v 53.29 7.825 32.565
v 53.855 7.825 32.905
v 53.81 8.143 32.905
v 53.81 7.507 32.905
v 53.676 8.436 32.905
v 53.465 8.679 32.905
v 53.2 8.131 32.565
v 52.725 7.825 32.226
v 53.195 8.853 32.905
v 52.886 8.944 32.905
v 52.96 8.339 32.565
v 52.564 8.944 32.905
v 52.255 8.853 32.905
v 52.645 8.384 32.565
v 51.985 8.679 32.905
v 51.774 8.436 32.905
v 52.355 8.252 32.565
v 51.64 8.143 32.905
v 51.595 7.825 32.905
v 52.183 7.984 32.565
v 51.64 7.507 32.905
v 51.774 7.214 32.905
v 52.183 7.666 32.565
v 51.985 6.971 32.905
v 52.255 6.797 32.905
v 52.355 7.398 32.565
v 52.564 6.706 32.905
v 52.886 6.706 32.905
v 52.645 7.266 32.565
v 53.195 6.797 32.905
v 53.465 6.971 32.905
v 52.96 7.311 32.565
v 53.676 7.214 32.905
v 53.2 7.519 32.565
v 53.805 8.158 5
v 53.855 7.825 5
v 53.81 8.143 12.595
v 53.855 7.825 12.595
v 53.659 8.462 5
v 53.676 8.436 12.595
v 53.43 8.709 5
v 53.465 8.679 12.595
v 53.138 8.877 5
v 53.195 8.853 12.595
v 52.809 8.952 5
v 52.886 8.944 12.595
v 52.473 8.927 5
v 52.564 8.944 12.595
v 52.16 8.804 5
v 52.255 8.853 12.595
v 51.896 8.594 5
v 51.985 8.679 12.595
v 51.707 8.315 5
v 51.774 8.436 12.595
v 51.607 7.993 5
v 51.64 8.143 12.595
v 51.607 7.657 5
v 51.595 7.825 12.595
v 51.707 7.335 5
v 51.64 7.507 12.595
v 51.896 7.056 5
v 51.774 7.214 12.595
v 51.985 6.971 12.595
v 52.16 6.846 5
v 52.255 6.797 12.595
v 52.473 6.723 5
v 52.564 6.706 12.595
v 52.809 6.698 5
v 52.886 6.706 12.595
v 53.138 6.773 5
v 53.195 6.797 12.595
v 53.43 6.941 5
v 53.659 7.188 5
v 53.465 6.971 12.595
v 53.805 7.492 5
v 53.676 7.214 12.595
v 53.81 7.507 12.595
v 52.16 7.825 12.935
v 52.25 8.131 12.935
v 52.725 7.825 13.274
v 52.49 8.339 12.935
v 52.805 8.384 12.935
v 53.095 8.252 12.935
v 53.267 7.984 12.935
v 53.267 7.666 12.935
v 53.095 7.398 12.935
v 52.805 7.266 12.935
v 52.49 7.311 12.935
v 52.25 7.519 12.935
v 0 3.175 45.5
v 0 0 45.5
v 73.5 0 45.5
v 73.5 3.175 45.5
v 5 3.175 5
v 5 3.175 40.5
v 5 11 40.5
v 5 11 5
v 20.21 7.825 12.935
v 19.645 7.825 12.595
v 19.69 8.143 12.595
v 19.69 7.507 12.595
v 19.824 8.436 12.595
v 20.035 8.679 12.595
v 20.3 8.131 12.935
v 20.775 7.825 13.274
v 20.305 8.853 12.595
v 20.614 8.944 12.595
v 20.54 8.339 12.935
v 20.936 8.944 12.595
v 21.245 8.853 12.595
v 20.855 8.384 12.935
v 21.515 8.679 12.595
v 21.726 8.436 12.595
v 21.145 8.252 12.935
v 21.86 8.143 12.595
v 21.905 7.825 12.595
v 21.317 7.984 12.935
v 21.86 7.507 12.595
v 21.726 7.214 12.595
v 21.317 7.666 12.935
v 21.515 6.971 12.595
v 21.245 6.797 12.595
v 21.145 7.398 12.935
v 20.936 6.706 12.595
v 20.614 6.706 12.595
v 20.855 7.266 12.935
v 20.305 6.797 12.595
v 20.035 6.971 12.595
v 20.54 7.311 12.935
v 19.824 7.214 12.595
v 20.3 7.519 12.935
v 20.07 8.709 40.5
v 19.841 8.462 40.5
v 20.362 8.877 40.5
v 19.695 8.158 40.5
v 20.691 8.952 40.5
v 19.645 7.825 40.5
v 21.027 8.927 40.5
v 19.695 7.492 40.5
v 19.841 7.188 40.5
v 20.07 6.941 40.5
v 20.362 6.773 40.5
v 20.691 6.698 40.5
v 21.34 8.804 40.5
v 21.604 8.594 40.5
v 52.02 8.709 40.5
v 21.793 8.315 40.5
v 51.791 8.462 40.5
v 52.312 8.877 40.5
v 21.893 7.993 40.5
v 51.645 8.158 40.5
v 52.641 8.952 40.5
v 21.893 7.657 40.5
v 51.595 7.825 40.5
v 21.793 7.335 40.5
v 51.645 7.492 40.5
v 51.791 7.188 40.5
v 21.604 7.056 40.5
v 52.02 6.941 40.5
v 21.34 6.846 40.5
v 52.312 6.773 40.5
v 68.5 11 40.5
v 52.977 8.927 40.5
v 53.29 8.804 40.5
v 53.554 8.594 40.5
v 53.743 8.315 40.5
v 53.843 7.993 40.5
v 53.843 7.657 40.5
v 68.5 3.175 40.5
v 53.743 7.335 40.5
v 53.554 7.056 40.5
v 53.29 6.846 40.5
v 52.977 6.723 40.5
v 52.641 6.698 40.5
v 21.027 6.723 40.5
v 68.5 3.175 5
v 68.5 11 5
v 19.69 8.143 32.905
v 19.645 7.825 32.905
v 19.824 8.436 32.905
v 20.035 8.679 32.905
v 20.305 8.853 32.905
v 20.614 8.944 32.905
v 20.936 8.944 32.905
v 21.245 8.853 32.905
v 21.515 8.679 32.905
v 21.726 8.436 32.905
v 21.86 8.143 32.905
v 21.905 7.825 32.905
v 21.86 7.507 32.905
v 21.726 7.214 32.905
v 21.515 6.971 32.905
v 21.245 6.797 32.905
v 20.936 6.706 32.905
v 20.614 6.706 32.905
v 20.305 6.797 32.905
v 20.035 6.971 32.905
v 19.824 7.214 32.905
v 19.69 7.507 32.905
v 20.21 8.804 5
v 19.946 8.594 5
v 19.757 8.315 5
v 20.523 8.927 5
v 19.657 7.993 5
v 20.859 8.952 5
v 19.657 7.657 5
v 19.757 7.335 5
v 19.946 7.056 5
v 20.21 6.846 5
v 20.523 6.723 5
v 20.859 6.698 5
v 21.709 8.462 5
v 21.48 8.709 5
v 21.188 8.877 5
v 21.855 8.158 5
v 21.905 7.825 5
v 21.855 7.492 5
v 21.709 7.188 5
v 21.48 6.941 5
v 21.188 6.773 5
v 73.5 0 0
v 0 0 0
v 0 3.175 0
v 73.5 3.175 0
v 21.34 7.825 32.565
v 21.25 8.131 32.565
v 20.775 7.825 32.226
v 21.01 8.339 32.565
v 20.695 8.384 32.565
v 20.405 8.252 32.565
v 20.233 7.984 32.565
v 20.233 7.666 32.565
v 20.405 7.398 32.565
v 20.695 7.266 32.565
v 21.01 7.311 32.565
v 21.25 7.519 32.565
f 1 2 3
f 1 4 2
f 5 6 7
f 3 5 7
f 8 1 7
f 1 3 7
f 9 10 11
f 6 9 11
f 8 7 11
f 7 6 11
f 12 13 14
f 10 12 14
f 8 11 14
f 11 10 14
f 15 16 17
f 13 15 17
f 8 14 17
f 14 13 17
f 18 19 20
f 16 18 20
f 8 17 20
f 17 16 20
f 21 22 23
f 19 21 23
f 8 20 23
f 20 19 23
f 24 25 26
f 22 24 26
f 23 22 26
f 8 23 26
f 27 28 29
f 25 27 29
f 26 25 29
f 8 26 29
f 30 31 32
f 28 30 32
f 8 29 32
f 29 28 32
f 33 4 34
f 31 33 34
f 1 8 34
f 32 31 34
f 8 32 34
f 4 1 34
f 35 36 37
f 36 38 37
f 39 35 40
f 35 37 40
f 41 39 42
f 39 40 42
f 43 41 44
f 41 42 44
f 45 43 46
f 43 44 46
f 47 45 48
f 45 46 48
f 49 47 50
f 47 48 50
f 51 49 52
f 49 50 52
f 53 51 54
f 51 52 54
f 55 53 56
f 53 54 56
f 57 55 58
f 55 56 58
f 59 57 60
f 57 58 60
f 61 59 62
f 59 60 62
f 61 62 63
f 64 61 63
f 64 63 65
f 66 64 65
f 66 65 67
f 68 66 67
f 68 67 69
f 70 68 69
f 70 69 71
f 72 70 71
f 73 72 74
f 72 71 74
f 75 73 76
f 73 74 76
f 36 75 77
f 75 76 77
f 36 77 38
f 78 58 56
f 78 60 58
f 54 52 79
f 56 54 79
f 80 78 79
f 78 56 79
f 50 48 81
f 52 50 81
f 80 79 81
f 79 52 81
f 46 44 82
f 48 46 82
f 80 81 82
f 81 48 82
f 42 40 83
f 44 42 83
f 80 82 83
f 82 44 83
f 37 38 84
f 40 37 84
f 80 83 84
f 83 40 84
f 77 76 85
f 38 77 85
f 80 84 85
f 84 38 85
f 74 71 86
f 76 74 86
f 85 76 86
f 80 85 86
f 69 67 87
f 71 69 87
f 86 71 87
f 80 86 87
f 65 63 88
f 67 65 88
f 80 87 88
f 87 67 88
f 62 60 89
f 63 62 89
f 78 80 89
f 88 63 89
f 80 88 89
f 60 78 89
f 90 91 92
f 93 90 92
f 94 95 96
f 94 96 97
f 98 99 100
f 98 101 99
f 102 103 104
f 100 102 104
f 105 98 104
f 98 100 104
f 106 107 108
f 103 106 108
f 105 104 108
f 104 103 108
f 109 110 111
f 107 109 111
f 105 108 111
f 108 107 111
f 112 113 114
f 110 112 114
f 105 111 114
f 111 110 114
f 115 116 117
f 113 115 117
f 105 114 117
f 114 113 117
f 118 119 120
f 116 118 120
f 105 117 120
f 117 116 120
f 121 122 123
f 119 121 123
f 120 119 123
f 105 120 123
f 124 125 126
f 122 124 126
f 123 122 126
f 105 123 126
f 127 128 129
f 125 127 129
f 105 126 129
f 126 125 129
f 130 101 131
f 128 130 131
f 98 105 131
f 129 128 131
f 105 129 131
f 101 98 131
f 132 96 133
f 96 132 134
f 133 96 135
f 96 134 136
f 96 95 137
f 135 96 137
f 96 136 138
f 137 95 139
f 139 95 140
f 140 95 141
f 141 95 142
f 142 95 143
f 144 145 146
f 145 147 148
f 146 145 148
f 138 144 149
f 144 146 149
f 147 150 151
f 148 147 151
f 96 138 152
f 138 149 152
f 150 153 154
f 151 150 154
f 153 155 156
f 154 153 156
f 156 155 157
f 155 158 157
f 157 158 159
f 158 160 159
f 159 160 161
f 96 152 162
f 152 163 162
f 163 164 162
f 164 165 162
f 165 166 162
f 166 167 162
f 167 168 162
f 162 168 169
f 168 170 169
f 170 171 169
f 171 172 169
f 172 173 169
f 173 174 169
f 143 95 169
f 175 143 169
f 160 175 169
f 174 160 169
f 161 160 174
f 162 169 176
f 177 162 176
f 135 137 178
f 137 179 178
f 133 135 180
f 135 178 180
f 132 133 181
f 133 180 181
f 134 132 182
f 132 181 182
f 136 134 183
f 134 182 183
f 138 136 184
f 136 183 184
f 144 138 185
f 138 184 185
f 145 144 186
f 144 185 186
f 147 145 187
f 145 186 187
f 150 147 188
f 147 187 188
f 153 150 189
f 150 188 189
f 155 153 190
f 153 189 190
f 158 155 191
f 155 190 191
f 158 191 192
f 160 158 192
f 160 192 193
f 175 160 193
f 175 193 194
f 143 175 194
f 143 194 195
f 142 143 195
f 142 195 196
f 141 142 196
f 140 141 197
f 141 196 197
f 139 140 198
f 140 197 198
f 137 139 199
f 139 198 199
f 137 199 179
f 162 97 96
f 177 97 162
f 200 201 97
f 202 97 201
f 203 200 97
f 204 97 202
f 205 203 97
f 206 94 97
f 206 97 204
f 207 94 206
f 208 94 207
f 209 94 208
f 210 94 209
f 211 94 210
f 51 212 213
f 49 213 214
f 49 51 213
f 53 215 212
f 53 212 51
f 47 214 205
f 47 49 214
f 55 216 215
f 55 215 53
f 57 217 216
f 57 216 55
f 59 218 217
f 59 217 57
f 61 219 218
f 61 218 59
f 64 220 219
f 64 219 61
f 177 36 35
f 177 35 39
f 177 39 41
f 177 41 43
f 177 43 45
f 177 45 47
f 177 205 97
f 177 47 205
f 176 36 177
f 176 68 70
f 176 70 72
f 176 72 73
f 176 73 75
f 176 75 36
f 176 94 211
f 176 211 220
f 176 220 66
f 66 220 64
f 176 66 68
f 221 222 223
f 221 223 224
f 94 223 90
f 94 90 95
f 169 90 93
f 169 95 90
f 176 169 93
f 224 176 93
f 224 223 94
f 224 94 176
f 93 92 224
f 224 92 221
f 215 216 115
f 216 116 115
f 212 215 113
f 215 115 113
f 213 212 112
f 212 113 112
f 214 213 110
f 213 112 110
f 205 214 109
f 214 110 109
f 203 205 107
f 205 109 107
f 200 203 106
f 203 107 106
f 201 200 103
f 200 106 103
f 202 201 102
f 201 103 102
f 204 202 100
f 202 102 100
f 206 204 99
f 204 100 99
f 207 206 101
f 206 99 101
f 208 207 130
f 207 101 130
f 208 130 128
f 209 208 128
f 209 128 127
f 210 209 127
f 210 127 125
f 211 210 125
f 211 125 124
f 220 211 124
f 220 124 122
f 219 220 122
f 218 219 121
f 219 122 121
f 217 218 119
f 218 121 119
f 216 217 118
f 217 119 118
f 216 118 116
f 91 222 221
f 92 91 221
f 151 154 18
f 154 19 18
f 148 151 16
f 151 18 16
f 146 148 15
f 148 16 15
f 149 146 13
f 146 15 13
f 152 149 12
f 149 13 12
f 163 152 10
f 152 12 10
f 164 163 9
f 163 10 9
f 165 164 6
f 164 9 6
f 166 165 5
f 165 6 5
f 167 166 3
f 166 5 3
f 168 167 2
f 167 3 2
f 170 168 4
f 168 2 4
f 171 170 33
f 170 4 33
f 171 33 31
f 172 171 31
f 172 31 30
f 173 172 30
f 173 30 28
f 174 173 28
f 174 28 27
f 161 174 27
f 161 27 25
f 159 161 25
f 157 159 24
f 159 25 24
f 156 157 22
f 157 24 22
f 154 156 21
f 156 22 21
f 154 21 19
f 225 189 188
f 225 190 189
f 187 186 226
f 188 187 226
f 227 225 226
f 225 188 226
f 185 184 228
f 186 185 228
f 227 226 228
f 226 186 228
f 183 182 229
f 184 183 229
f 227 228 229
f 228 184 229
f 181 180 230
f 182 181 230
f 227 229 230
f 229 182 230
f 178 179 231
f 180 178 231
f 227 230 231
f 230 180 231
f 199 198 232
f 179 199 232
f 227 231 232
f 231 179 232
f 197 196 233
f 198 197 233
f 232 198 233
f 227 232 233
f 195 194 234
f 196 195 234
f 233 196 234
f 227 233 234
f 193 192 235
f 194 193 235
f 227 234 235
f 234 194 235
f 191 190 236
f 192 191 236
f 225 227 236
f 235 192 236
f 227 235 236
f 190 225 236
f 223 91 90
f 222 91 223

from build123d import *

# Parameters (mm, degrees)
MAIN_SKETCH_W                         = 73.5
MAIN_SKETCH_H                         = 45.5
MAIN_SKETCH_W_2                       = 63.5
MAIN_SKETCH_H_2                       = 35.5
LIP_DEPTH                             = 3.175
MOUNTING_BASE_OUTLINE_W               = 63.5
MOUNTING_BASE_OUTLINE_H               = 35.5
MOUNTING_BASE_DEPTH                   = 11
HEATER_CART_4_40_TAPS_D               = 2.2606
HEATER_CART_4_40_TAPS_DEPTH           = 7.595
HEATER_CART_4_40_TAPS_TIP             = 0.679152758
HEATER_CART_4_40_TAPS_ON_FACE_2_D     = 2.2606
HEATER_CART_4_40_TAPS_ON_FACE_2_DEPTH = 7.595
HEATER_CART_4_40_TAPS_ON_FACE_2_TIP   = 0.679152758


# Read off the part's stored shape, not the designer's step: Mounting_Base
with BuildPart() as part:
    # Main_Sketch → Lip (new body)
    with BuildSketch(Plane(origin=(0, 0, 0), x_dir=(1, 0, 0), z_dir=(0, 1, 0))):
        with Locations((36.75, -22.75)):
            Rectangle(MAIN_SKETCH_W, MAIN_SKETCH_H)
        with Locations((36.75, -22.75)):
            Rectangle(MAIN_SKETCH_W_2, MAIN_SKETCH_H_2, mode=Mode.SUBTRACT)
    extrude(amount=LIP_DEPTH)

    # Mounting_Base outline → Mounting_Base (add)
    with BuildSketch(Plane(origin=(0, 0, 0), x_dir=(1, 0, 0), z_dir=(0, 1, 0))):
        with Locations((36.75, -22.75)):
            Rectangle(MOUNTING_BASE_OUTLINE_W, MOUNTING_BASE_OUTLINE_H)
    extrude(amount=MOUNTING_BASE_DEPTH)

    # Heater_Cart_#4-40_Taps
    with Locations(Plane(origin=(52.725, 7.825, 5), x_dir=(-1, 0, 0), z_dir=(0, 0, -1))):
        with Locations((0, 0), (31.95, 0)):
            Hole(HEATER_CART_4_40_TAPS_D / 2, depth=HEATER_CART_4_40_TAPS_DEPTH)
            with Locations((0, 0, -(HEATER_CART_4_40_TAPS_DEPTH + HEATER_CART_4_40_TAPS_TIP / 2))):  # 118° drill point
                Cone(0, HEATER_CART_4_40_TAPS_D / 2, HEATER_CART_4_40_TAPS_TIP, mode=Mode.SUBTRACT)

    # Heater_Cart_#4-40_Taps on face 2
    with Locations(Plane(origin=(20.775, 7.825, 40.5), x_dir=(1, 0, 0), z_dir=(0, 0, 1))):
        with Locations((0, 0), (31.95, 0)):
            Hole(HEATER_CART_4_40_TAPS_ON_FACE_2_D / 2, depth=HEATER_CART_4_40_TAPS_ON_FACE_2_DEPTH)
            with Locations((0, 0, -(HEATER_CART_4_40_TAPS_ON_FACE_2_DEPTH + HEATER_CART_4_40_TAPS_ON_FACE_2_TIP / 2))):  # 118° drill point
                Cone(0, HEATER_CART_4_40_TAPS_ON_FACE_2_D / 2, HEATER_CART_4_40_TAPS_ON_FACE_2_TIP, mode=Mode.SUBTRACT)


solid = part.part
